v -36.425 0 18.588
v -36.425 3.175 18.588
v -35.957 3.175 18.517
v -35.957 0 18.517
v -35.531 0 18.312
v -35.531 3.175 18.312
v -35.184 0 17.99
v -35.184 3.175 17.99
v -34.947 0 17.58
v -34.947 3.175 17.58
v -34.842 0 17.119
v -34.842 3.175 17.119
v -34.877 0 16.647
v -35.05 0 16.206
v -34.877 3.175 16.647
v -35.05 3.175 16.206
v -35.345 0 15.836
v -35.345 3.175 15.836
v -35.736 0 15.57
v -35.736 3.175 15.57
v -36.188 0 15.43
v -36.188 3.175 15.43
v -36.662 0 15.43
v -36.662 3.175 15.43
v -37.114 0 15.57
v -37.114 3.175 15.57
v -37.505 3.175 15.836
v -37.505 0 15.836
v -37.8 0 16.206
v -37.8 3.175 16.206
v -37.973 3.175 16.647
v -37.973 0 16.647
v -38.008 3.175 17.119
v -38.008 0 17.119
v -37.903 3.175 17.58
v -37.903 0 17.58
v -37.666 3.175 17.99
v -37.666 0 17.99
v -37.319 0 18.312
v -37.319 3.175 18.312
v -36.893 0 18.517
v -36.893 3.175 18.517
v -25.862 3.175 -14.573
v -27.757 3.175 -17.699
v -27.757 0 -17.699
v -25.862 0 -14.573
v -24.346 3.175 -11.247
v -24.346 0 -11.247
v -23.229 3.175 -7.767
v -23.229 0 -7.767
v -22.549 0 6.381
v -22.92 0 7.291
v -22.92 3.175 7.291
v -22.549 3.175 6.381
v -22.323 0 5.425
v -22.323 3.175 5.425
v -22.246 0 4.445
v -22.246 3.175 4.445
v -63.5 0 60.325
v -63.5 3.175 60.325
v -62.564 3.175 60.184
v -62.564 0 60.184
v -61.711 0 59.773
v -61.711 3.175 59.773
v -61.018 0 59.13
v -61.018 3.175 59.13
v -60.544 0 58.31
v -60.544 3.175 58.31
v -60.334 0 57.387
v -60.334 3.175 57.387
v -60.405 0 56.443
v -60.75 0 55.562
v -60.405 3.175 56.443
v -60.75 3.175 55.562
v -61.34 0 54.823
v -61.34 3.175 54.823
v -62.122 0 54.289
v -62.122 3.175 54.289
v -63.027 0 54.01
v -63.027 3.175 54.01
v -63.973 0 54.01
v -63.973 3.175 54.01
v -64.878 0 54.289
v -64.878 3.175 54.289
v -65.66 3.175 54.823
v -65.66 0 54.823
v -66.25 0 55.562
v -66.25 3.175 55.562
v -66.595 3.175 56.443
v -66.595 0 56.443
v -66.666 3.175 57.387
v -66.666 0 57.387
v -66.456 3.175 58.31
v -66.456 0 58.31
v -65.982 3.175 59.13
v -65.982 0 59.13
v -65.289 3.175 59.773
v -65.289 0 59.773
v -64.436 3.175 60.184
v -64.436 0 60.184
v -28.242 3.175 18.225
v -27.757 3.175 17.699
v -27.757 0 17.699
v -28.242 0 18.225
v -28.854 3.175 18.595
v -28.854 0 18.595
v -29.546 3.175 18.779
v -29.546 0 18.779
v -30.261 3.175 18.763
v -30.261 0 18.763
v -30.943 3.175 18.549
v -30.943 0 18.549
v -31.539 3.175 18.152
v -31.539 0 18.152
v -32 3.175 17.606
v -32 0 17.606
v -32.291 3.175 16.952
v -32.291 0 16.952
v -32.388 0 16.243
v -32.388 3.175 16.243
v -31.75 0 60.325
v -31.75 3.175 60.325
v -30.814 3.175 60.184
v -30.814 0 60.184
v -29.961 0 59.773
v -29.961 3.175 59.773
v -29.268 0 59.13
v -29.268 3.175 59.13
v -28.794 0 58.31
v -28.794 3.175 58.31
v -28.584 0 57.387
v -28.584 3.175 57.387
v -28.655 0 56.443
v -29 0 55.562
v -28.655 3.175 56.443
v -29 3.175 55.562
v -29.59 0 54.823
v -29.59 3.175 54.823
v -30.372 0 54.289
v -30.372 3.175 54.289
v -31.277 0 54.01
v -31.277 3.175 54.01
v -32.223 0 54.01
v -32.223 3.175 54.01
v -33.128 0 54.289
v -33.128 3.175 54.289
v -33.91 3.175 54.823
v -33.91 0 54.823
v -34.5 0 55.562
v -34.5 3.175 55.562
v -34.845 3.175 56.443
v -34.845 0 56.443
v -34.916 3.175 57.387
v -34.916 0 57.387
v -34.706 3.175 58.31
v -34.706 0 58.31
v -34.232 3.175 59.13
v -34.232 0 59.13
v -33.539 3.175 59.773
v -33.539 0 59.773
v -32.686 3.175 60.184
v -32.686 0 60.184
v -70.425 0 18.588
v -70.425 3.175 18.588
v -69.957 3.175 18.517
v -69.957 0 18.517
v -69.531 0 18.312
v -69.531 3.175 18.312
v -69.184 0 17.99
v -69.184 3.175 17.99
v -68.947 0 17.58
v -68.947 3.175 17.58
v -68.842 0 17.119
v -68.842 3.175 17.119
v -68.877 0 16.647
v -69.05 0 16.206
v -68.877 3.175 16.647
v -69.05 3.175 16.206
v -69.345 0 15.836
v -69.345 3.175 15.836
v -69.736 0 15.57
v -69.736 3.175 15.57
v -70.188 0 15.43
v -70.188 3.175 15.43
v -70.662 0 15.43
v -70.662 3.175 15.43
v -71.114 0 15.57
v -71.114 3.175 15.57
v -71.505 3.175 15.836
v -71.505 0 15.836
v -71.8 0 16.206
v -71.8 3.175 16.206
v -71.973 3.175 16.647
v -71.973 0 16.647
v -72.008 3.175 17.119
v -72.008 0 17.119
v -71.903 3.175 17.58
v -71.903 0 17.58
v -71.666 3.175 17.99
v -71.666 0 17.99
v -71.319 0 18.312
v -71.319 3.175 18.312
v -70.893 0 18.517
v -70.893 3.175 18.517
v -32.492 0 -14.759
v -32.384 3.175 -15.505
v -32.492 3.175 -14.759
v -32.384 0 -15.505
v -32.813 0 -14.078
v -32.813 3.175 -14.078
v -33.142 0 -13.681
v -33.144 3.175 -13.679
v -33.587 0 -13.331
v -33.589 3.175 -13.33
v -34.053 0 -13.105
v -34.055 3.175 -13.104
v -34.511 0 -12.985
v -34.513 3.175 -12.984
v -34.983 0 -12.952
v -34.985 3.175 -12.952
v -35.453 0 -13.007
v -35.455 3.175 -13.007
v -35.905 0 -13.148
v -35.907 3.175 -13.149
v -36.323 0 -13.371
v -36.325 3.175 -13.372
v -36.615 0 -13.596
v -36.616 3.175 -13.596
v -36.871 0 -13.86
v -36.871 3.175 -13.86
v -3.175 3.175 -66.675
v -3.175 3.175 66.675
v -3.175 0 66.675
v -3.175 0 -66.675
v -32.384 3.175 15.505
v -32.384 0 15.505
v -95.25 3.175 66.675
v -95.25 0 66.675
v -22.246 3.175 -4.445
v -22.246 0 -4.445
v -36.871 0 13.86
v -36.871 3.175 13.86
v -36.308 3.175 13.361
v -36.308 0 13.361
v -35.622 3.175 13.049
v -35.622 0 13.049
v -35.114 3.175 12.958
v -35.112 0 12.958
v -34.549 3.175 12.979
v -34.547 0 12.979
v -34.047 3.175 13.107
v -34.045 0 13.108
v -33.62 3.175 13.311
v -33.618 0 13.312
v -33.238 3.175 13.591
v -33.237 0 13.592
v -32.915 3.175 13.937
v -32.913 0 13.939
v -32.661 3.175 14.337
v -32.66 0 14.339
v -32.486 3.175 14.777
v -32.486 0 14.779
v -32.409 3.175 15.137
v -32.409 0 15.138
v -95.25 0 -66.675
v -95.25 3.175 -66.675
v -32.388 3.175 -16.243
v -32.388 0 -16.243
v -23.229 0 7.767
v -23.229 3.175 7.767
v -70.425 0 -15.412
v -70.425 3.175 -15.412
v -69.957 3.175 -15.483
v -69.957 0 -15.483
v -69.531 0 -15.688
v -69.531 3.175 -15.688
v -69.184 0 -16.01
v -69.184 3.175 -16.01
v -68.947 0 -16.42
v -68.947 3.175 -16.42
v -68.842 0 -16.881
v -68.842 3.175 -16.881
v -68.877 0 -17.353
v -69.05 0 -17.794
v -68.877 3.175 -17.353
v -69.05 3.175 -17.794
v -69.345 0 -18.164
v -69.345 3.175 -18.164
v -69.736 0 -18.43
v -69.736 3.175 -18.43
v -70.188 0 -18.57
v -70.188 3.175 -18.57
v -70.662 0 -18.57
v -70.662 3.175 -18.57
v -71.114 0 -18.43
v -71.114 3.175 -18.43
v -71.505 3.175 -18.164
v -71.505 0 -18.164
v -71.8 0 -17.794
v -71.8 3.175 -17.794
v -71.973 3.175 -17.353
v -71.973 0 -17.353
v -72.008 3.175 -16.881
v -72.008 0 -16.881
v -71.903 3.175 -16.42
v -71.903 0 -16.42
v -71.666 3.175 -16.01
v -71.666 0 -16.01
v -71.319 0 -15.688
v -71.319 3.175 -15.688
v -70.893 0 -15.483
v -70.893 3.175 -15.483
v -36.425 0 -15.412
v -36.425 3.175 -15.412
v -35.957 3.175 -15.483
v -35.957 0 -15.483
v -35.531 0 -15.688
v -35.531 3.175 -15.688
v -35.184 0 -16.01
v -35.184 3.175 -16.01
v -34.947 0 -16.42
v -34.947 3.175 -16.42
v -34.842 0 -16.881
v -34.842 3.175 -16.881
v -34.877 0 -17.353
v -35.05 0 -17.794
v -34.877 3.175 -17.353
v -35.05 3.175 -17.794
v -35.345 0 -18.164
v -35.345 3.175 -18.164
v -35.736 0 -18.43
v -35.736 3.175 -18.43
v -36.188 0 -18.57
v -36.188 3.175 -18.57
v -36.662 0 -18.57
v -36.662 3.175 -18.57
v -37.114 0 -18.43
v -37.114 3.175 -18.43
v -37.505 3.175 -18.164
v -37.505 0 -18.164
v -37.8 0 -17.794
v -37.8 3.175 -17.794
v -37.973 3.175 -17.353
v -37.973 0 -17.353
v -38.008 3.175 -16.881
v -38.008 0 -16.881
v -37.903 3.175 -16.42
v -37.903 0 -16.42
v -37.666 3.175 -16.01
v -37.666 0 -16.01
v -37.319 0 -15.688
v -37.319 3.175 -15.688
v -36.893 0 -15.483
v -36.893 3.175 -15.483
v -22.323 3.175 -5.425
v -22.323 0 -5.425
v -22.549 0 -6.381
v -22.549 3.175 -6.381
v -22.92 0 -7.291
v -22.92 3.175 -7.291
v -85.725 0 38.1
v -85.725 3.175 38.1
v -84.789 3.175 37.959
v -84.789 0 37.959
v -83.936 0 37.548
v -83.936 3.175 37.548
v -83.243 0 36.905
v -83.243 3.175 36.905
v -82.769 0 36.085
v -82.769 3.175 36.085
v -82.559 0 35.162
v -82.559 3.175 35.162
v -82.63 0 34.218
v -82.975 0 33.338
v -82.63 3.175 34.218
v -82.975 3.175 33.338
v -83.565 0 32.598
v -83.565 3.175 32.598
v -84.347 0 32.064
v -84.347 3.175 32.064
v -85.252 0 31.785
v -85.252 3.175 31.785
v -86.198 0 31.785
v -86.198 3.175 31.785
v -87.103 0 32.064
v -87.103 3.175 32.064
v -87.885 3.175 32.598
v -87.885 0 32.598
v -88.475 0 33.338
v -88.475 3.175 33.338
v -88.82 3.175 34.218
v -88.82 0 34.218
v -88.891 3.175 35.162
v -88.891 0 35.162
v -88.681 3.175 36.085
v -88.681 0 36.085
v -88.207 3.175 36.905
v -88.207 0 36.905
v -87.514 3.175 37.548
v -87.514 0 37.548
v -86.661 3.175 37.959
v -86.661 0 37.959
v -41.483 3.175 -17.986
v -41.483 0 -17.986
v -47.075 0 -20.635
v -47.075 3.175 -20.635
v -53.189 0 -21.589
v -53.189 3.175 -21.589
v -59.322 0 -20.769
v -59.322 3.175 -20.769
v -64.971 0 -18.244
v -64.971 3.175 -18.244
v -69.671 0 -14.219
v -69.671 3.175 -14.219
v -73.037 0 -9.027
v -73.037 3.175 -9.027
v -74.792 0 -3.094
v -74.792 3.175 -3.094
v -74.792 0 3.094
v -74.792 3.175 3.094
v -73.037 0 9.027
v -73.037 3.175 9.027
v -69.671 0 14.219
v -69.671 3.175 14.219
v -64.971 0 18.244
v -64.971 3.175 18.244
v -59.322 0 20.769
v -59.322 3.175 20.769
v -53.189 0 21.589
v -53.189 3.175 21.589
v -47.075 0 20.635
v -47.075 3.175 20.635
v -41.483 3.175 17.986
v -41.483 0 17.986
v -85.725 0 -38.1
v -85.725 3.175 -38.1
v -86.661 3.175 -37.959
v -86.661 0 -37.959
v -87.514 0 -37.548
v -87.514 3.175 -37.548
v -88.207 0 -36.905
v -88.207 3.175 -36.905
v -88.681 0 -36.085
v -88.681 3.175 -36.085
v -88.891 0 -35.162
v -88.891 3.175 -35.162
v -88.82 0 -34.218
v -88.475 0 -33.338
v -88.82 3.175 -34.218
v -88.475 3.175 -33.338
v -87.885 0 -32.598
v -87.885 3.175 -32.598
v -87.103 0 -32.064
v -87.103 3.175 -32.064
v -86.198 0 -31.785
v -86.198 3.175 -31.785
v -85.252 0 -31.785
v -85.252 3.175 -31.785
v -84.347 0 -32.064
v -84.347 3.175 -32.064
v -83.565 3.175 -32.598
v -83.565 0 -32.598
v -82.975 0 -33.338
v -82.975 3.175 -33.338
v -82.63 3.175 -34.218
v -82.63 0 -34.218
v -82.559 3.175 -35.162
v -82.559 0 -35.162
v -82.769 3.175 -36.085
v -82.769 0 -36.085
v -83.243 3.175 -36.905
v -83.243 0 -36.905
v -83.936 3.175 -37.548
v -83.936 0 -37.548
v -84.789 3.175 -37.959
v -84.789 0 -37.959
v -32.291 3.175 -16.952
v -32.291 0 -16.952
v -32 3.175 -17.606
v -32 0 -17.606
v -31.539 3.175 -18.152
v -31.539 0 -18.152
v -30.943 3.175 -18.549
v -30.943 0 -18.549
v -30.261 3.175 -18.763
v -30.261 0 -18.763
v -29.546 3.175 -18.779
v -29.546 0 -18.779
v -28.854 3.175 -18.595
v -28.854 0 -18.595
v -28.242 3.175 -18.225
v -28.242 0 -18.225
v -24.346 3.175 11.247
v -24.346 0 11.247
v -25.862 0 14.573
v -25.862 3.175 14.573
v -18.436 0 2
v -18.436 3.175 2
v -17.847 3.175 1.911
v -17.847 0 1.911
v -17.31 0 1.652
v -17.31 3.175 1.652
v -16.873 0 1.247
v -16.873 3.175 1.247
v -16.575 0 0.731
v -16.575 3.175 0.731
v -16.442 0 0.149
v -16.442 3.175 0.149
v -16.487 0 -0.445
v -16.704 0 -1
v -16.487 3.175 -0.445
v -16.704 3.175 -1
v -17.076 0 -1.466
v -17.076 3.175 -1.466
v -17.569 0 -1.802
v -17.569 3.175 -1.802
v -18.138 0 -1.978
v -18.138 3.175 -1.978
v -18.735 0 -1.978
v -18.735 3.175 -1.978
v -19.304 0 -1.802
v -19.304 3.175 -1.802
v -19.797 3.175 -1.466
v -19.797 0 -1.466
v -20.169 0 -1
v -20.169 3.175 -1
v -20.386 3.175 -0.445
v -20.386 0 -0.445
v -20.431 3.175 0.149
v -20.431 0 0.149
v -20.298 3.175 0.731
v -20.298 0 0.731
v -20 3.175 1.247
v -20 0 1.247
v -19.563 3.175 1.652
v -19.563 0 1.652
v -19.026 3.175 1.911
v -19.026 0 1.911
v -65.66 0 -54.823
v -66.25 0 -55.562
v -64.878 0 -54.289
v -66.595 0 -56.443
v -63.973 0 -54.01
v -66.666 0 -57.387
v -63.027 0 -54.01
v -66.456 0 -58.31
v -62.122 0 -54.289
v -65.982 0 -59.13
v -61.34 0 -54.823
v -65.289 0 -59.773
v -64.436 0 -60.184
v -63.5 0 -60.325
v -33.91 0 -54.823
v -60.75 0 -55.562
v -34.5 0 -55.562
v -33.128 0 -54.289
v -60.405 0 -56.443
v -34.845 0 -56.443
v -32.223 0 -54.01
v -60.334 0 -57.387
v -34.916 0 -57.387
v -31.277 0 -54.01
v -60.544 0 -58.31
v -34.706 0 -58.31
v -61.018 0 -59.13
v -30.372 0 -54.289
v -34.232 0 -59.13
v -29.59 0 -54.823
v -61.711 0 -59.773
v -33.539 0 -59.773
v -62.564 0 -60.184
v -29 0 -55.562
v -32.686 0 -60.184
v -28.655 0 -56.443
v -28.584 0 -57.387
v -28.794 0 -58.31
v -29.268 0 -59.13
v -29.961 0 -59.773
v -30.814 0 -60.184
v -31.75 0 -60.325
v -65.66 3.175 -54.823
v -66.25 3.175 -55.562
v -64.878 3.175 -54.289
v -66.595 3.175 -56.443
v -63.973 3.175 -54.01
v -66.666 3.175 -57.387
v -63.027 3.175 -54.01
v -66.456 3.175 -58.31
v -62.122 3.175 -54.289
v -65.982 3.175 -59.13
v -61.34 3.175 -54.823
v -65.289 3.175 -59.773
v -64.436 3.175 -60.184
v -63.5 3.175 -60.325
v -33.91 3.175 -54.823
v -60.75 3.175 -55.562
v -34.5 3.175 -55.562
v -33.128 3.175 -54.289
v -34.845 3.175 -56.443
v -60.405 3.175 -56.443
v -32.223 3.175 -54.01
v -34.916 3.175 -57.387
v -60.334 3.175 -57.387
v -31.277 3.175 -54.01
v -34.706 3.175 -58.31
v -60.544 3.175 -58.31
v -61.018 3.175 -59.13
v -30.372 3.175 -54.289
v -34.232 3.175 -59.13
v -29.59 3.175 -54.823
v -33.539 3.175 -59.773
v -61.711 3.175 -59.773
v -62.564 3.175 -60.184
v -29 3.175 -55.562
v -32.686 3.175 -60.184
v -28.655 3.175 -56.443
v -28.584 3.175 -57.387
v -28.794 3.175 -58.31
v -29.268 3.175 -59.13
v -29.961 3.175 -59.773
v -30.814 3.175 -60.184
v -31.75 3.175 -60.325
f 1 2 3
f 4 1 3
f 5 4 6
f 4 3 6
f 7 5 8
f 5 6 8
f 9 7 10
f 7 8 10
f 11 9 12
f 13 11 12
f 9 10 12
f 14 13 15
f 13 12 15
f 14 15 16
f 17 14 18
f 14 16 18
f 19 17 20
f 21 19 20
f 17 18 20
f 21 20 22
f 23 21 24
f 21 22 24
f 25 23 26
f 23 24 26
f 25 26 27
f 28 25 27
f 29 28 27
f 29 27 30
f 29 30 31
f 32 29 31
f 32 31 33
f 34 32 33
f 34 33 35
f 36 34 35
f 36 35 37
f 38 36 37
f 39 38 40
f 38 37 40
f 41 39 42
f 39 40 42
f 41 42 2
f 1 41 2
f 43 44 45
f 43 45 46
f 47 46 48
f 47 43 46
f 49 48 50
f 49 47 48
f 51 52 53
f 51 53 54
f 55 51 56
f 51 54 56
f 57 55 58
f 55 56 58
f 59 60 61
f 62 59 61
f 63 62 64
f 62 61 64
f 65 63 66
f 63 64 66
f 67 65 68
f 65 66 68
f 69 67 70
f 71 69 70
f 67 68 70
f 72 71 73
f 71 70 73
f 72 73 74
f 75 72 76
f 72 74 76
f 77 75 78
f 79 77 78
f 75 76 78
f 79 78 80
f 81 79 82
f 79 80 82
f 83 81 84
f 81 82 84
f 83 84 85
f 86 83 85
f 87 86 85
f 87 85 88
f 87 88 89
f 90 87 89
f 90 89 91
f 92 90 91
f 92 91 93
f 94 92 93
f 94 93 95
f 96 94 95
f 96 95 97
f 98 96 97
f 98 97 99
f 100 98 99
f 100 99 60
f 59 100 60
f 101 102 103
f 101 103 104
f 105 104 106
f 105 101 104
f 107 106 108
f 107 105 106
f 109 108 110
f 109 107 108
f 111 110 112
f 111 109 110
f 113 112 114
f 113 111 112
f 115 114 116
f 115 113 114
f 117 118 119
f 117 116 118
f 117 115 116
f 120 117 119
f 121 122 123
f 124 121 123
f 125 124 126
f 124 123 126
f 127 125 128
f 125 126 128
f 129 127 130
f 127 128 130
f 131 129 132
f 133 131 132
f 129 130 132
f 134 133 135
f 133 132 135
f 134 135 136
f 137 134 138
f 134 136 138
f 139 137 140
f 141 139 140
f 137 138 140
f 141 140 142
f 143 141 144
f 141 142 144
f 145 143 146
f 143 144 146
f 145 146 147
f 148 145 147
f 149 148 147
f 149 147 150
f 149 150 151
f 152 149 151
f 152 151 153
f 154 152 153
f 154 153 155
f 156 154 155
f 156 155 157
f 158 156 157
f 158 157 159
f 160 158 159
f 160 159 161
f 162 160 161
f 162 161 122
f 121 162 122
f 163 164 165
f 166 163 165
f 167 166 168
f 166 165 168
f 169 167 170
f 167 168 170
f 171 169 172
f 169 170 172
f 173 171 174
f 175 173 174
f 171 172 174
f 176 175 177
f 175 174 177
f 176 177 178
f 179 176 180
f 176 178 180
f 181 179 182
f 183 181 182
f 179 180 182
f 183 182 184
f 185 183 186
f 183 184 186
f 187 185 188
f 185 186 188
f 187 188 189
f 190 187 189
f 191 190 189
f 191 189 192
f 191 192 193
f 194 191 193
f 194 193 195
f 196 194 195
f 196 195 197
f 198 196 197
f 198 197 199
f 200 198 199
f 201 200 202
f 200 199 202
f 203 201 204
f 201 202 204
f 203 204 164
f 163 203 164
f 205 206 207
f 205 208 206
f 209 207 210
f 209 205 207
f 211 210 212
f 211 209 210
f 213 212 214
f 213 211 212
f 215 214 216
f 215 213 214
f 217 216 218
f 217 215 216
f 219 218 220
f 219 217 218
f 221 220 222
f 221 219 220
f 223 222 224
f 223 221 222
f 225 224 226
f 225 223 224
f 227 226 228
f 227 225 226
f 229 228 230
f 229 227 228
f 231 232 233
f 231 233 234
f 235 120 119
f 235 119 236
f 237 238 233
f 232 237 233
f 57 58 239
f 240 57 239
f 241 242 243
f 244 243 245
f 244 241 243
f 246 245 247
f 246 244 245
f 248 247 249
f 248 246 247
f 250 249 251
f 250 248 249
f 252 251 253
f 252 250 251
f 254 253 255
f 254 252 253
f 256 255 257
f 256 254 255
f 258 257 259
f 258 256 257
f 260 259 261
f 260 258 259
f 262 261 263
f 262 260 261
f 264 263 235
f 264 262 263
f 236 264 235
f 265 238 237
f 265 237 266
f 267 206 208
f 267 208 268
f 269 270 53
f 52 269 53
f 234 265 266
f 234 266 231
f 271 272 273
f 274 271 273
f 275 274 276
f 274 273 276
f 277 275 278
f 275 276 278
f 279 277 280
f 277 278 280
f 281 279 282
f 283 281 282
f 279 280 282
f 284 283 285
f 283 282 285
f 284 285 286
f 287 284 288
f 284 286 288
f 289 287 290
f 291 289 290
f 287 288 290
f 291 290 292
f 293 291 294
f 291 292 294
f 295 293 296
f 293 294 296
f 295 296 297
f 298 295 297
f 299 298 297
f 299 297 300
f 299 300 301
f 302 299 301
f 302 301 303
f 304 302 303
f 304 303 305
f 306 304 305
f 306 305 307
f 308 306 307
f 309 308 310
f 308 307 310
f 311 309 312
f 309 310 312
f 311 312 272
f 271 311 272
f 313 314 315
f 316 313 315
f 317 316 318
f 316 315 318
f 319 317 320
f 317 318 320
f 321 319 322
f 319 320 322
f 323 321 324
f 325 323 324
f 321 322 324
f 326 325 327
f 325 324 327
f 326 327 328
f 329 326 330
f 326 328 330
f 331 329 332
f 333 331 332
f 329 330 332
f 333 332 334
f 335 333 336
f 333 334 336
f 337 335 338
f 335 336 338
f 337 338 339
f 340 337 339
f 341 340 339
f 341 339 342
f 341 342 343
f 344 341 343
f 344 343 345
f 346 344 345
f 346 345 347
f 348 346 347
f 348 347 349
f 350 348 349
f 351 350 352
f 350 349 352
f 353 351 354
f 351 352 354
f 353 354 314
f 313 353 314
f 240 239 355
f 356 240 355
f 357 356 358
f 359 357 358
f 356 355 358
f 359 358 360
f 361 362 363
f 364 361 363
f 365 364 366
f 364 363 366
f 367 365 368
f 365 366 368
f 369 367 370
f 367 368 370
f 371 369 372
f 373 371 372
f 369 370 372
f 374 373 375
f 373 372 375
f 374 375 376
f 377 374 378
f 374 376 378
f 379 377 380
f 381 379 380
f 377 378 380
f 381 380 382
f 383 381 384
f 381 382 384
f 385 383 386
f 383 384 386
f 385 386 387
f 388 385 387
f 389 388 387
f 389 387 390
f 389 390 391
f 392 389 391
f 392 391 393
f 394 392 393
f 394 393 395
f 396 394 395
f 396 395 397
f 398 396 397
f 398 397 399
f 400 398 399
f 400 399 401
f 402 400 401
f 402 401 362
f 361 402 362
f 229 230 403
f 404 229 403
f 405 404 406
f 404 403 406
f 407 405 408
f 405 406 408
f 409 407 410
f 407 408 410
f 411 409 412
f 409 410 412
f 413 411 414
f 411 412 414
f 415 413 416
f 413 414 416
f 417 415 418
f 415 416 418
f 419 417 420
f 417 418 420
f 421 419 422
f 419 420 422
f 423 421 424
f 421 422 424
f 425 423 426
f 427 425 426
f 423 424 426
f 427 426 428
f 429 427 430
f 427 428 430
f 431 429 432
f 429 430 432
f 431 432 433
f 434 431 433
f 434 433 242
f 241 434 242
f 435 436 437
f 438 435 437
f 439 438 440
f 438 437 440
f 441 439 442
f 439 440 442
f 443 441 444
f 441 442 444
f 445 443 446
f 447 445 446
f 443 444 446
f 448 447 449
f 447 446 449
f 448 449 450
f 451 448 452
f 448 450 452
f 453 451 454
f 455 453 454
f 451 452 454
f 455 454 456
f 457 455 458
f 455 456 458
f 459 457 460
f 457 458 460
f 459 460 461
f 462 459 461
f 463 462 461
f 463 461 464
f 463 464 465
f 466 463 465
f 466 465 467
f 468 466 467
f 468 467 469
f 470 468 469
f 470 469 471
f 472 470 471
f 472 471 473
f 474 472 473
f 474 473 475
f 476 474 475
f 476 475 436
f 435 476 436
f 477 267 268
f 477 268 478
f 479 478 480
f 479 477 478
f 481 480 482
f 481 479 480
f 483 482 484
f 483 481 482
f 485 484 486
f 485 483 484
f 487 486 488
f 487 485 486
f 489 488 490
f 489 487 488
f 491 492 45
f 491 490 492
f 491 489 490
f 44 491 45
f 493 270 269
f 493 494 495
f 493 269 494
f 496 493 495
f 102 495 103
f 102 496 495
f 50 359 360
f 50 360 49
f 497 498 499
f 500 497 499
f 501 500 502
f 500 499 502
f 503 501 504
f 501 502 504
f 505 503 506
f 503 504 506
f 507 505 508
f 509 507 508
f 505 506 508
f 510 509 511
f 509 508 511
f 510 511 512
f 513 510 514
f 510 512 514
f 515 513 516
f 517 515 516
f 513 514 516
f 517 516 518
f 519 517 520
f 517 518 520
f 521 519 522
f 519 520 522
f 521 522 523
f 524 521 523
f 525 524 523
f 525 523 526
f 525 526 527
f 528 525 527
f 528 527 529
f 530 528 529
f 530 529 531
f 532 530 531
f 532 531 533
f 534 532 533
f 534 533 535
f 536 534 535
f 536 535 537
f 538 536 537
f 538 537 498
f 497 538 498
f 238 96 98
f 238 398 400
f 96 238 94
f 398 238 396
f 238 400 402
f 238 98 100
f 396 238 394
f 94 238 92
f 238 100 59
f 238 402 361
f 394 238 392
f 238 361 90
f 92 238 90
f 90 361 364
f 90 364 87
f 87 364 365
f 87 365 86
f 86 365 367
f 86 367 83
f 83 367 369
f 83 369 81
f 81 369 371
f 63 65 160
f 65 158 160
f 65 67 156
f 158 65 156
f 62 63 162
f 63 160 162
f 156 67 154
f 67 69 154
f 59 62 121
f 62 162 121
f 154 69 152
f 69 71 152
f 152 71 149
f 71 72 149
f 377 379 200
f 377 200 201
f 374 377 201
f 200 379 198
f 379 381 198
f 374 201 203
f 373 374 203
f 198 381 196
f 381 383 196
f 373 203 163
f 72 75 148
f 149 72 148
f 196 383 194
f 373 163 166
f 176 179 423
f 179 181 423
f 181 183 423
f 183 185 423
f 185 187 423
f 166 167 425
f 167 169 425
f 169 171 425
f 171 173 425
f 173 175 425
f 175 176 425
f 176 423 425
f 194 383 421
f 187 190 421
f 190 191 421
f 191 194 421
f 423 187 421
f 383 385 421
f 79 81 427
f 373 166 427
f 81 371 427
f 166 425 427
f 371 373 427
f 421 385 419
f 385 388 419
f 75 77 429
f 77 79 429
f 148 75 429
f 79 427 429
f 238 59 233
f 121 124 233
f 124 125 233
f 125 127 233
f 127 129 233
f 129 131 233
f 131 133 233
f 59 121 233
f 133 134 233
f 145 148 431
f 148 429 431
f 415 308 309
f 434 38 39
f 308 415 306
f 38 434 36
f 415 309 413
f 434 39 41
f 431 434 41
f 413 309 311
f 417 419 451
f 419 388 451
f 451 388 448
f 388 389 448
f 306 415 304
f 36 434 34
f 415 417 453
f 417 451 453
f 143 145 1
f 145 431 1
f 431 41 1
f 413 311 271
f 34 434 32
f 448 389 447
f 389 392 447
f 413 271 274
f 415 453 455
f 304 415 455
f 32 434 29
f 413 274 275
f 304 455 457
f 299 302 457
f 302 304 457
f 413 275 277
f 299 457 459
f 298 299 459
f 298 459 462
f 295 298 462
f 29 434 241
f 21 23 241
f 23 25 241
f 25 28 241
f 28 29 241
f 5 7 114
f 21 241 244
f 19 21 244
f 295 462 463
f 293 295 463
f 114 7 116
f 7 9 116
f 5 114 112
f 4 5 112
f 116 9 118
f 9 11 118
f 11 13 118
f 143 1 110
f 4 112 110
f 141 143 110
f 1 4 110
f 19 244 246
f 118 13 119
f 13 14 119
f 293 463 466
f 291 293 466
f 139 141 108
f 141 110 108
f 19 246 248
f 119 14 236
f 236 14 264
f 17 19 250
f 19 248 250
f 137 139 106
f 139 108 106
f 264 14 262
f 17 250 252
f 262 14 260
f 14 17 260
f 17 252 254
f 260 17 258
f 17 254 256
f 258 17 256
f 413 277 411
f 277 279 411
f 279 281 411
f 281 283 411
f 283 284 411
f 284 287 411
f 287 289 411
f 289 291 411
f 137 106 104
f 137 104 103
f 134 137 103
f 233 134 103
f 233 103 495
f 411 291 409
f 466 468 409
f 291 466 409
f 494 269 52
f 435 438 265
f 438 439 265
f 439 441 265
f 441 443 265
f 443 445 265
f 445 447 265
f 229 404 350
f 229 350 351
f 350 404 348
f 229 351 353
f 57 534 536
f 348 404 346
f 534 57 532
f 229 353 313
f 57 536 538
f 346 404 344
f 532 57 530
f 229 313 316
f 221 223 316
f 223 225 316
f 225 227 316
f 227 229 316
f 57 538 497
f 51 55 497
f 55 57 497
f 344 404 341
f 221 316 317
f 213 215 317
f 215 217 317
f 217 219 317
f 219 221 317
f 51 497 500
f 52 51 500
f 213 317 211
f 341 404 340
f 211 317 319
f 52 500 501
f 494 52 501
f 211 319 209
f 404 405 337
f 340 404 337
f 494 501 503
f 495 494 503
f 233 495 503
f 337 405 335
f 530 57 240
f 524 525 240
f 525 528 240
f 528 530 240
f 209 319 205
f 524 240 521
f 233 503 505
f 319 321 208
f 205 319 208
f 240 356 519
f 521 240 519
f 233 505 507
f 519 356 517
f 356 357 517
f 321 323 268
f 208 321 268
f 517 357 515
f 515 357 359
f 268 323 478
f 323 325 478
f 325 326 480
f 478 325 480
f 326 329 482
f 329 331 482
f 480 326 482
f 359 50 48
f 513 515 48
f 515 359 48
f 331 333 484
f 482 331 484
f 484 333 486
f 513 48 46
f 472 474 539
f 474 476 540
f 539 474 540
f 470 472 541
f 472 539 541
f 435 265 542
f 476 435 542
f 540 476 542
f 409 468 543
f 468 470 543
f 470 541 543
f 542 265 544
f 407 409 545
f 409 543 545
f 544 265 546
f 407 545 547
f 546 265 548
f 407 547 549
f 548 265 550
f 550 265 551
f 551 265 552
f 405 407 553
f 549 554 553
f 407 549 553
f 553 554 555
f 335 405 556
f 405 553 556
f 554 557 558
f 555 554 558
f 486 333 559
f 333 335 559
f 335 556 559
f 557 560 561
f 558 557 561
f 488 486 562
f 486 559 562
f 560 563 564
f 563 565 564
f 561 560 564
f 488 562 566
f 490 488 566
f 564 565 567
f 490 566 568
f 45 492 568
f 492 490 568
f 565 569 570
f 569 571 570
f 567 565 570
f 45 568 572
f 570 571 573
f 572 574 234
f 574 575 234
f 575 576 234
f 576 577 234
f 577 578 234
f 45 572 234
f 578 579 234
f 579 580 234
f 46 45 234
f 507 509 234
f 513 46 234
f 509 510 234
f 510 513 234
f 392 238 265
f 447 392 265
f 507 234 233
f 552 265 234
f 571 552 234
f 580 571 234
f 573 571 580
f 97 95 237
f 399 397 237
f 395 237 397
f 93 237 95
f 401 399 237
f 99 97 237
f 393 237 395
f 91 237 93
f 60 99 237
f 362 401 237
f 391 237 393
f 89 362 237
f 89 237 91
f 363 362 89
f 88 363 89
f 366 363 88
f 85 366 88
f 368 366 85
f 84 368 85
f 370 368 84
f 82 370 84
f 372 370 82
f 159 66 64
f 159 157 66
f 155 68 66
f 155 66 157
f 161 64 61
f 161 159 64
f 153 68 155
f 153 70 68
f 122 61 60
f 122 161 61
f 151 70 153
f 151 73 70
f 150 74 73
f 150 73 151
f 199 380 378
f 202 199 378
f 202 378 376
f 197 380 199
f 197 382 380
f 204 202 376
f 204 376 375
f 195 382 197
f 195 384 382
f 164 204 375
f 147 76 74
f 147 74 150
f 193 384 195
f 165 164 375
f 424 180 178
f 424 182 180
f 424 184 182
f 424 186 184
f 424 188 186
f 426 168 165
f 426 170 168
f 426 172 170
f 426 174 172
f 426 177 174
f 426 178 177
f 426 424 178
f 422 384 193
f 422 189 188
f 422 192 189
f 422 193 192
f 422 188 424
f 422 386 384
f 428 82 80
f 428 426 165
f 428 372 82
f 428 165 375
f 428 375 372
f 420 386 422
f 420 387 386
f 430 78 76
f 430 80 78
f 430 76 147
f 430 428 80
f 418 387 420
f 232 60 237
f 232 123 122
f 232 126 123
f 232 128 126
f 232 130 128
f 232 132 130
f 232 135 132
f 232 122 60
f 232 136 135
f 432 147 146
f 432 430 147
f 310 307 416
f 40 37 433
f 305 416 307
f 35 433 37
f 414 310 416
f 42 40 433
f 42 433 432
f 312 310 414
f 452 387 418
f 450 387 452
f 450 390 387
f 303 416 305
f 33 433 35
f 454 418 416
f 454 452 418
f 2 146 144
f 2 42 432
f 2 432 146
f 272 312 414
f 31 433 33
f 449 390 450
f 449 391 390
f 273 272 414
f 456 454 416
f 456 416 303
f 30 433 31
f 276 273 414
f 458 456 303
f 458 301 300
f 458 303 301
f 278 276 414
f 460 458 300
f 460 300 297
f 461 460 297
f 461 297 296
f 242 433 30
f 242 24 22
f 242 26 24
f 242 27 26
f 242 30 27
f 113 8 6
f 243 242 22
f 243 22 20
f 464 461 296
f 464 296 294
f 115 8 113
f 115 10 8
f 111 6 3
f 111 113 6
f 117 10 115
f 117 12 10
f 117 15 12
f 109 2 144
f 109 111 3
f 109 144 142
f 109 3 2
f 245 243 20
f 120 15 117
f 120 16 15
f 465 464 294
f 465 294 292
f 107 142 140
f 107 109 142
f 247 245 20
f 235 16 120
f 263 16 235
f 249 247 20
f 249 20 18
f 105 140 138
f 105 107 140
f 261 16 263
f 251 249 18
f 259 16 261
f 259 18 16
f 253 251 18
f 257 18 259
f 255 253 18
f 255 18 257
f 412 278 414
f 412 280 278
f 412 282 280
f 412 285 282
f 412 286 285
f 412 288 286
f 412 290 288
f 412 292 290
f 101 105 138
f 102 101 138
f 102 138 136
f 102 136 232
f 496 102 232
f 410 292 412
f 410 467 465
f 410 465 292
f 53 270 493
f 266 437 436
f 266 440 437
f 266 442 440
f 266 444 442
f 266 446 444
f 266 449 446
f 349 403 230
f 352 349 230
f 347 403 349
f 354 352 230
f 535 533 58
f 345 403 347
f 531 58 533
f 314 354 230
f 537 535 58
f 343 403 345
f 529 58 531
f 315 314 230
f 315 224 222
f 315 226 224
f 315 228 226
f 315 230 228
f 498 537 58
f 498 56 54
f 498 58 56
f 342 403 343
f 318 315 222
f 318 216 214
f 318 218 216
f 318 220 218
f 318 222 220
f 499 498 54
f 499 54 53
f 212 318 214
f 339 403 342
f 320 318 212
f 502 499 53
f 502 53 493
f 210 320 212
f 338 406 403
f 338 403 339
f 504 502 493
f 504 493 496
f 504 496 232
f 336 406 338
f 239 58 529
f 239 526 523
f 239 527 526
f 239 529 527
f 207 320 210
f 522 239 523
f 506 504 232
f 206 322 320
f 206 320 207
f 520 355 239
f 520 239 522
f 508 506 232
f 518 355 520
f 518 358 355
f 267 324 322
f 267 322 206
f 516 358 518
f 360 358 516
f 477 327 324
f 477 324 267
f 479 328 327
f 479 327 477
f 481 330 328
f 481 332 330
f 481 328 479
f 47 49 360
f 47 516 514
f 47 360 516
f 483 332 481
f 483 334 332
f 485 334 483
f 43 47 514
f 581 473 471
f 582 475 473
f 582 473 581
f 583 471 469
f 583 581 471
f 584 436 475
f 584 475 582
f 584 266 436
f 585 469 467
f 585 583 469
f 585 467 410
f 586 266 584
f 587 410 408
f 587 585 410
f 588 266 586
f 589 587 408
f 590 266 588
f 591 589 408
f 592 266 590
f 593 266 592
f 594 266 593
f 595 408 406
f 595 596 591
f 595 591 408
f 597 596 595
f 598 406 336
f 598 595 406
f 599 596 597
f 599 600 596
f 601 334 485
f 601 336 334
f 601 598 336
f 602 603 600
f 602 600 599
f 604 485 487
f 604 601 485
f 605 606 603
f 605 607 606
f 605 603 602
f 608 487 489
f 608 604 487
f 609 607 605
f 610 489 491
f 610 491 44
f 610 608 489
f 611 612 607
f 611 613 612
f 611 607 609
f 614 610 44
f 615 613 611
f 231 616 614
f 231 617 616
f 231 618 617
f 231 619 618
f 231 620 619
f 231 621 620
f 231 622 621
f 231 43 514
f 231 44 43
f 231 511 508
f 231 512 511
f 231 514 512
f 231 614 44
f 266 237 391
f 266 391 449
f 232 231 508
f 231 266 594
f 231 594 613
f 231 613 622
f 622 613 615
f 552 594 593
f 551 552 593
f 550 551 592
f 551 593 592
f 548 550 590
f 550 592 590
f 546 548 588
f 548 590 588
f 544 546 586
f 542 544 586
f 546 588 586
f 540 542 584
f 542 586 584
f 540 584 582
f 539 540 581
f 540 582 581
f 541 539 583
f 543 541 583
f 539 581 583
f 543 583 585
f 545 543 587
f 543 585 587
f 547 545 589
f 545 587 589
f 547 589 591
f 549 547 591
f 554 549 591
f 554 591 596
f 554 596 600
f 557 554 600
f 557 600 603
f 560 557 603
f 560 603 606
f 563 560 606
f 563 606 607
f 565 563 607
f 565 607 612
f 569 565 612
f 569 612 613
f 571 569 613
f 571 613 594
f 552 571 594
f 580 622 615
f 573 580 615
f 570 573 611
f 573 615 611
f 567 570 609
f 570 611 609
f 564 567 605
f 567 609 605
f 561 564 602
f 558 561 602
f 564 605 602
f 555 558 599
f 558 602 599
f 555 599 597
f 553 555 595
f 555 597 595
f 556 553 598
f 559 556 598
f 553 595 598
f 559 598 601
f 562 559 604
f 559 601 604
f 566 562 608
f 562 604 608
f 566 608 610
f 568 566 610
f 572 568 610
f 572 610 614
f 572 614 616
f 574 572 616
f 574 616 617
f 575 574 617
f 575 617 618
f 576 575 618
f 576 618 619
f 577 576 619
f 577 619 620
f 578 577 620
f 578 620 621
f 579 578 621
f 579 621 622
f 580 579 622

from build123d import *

# Parameters (mm, degrees)
SKETCH1_W           = 190.5
SKETCH1_H           = 133.35
BOSS_EXTRUDE1_DEPTH = 3.175
SKETCH3_R           = 21.59
CUT_EXTRUDE2_DEPTH  = 117.310785183
SKETCH4_R           = 1.5875
CUT_EXTRUDE3_DEPTH  = 3.175
SKETCH9_R           = 2
CUT_EXTRUDE5_DEPTH  = 10
SKETCH12_W          = 98.425
SKETCH12_H          = 133.35
CUT_EXTRUDE6_DEPTH  = 117.310785183
SKETCH13_R          = 3.175
CUT_EXTRUDE7_DEPTH  = 117.310785183
CUT_EXTRUDE8_DEPTH  = 117.310785183
BOSS_EXTRUDE2_DEPTH = 3.175
FILLET1_R           = 2.54
CUT_EXTRUDE9_DEPTH  = 117.310785325
FILLET2_R           = 2.54


with BuildPart() as part:
    # Sketch1 → Boss-Extrude1 (new body)
    with BuildSketch(Plane(origin=(0, 0, 0), x_dir=(1, 0, 0), z_dir=(0, 1, 0))):
        Rectangle(SKETCH1_W, SKETCH1_H)
    extrude(amount=BOSS_EXTRUDE1_DEPTH)

    # Sketch3 → Cut-Extrude2 (cut, through all)
    with BuildSketch(Plane(origin=(0, 3.175, 0), x_dir=(1, 0, 0), z_dir=(0, 1, 0))):
        with Locations(Location((-53.425, 0, 0), (0, 0, 270))):
            Circle(SKETCH3_R)
    extrude(amount=-CUT_EXTRUDE2_DEPTH, mode=Mode.SUBTRACT)

    # Sketch4 → Cut-Extrude3 (cut)
    with BuildSketch(Plane(origin=(0, 3.175, 0), x_dir=(1, 0, 0), z_dir=(0, 1, 0))):
        with Locations(Location((-70.425, 17, 0), (0, 0, 270))):
            Circle(SKETCH4_R)
        with Locations(Location((-36.425, 17, 0), (0, 0, 270))):
            Circle(SKETCH4_R)
        with Locations(Location((-70.425, -17, 0), (0, 0, 270))):
            Circle(SKETCH4_R)
        with Locations(Location((-36.425, -17, 0), (0, 0, 270))):
            Circle(SKETCH4_R)
    extrude(amount=-CUT_EXTRUDE3_DEPTH, mode=Mode.SUBTRACT)

    # Sketch9 → Cut-Extrude5 (cut)
    with BuildSketch(Plane(origin=(0, 3.175, 0), x_dir=(1, 0, 0), z_dir=(0, 1, 0))):
        with Locations(Location((-18.4365, 0, 0), (0, 0, 270))):
            Circle(SKETCH9_R)
    extrude(amount=-CUT_EXTRUDE5_DEPTH, mode=Mode.SUBTRACT)

    # Sketch12 → Cut-Extrude6 (cut, through all)
    with BuildSketch(Plane(origin=(0, 3.175, 0), x_dir=(1, 0, 0), z_dir=(0, 1, 0))):
        with Locations((46.0375, 0)):
            Rectangle(SKETCH12_W, SKETCH12_H)
    extrude(amount=-CUT_EXTRUDE6_DEPTH, mode=Mode.SUBTRACT)

    # Sketch13 → Cut-Extrude7 (cut, through all)
    with BuildSketch(Plane(origin=(0, 3.175, 0), x_dir=(1, 0, 0), z_dir=(0, 1, 0))):
        with Locations(Location((-63.5, -57.15, 0), (0, 0, 270))):
            Circle(SKETCH13_R)
        with Locations(Location((-31.75, -57.15, 0), (0, 0, 270))):
            Circle(SKETCH13_R)
        with Locations(Location((-85.725, -34.925, 0), (0, 0, 270))):
            Circle(SKETCH13_R)
        with Locations(Location((-85.725, 34.925, 0), (0, 0, 90))):
            Circle(SKETCH13_R)
        with Locations(Location((-31.75, 57.15, 0), (0, 0, 90))):
            Circle(SKETCH13_R)
        with Locations(Location((-63.5, 57.15, 0), (0, 0, 90))):
            Circle(SKETCH13_R)
    extrude(amount=-CUT_EXTRUDE7_DEPTH, mode=Mode.SUBTRACT)

    # Sketch14 → Cut-Extrude8 (cut, through all)
    with BuildSketch(Plane(origin=(0, 3.175, 0), x_dir=(1, 0, 0), z_dir=(0, 1, 0))):
        with BuildLine():
            Line((-28.5965, 10.795), (-34.727511532, 10.795))
            ThreePointArc((-34.727511532, 10.795), (-32.57066141, 5.587903184), (-31.835, 0))
            ThreePointArc((-31.835, 0), (-32.57066141, -5.587903184), (-34.727511532, -10.795))
            Line((-34.727511532, -10.795), (-28.5965, -10.795))
            ThreePointArc((-28.5965, -10.795), (-24.106371939, -8.935128061), (-22.2465, -4.445))
            Line((-22.2465, -4.445), (-22.2465, 4.445))
            ThreePointArc((-22.2465, 4.445), (-24.106371939, 8.935128061), (-28.5965, 10.795))
        make_face()
    extrude(amount=-CUT_EXTRUDE8_DEPTH, mode=Mode.SUBTRACT)

    # Sketch17 → Boss-Extrude2 (add)
    with BuildSketch(Plane(origin=(0, 3.175, 0), x_dir=(1, 0, 0), z_dir=(0, 1, 0))):
        with BuildLine():
            Line((-27.617916938, -2.569394862), (-29.842146395, -2.569394862))
            ThreePointArc((-29.842146395, -2.569394862), (-31.436748095, -3.132314839), (-32.324552038, -4.571563824))
            ThreePointArc((-32.324552038, -4.571563824), (-33.284202462, -7.776655742), (-34.727511532, -10.795))
            Line((-34.727511532, -10.795), (-28.5965, -10.795))
            ThreePointArc((-28.5965, -10.795), (-26.282004071, -10.358172465), (-24.285944537, -9.107790109))
            add(Edge.make_bspline(
                [(-24.285944537, -9.107790109), (-25.296427545, -8.702059101), (-27.426842977, -8.424005167), (-31.492325334, -5.200003891), (-29.562733021, -3.217728636), (-27.592836679, -2.82089378)],
                knots=[0.242965458, 0.242965458, 0.242965458, 0.242965458, 0.418906137, 0.719122828, 0.942603955, 0.942603955, 0.942603955, 0.942603955], degree=3))
            ThreePointArc((-27.592836679, -2.82089378), (-27.491543755, -2.683792533), (-27.617916938, -2.569394862))
        make_face()
        with BuildLine():
            Line((-34.727511532, 10.795), (-28.5965, 10.795))
            ThreePointArc((-28.5965, 10.795), (-26.282004071, 10.358172465), (-24.285944537, 9.107790109))
            add(Edge.make_bspline(
                [(-24.285944537, 9.107790109), (-25.296427545, 8.702059101), (-27.426842977, 8.424005167), (-31.492325334, 5.200003891), (-29.562733021, 3.217728636), (-27.592836679, 2.82089378)],
                knots=[0.242965458, 0.242965458, 0.242965458, 0.242965458, 0.418906137, 0.719122828, 0.942603955, 0.942603955, 0.942603955, 0.942603955], degree=3))
            ThreePointArc((-27.592836679, 2.82089378), (-27.491543755, 2.683792533), (-27.617916938, 2.569394862))
            Line((-27.617916938, 2.569394862), (-29.842146395, 2.569394862))
            ThreePointArc((-29.842146395, 2.569394862), (-31.436748095, 3.132314839), (-32.324552038, 4.571563824))
            ThreePointArc((-32.324552038, 4.571563824), (-33.284202462, 7.776655742), (-34.727511532, 10.795))
        make_face()
    extrude(amount=-BOSS_EXTRUDE2_DEPTH)

    # Fillet1
    fillet1_edges = [part.edges().sort_by_distance(p)[0] for p in [
        (-24.285944537, 1.5875, 9.107790109),
        (-24.285944537, 1.5875, -9.107790109),
    ]]
    fillet(fillet1_edges, radius=FILLET1_R)

    # Sketch20 → Cut-Extrude9 (cut, through all)
    with BuildSketch(Plane(origin=(0, 3.175, 0), x_dir=(1, 0, 0), z_dir=(0, 1, 0))):
        with BuildLine():
            Line((-32.388013842, -16.243224247), (-32.324552038, -4.571563824))
            ThreePointArc((-32.324552038, -4.571563824), (-31.835, 0), (-32.324552038, 4.571563824))
            Line((-32.324552038, 4.571563824), (-32.388013842, 16.243224247))
            ThreePointArc((-32.388013842, 16.243224247), (-30.609708534, 18.68014804), (-27.75696947, 17.698900276))
            ThreePointArc((-27.75696947, 17.698900276), (-22.2465, 0), (-27.75696947, -17.698900276))
            ThreePointArc((-27.75696947, -17.698900276), (-30.609708534, -18.68014804), (-32.388013842, -16.243224247))
        make_face()
    extrude(amount=-CUT_EXTRUDE9_DEPTH, mode=Mode.SUBTRACT)

    # Fillet2
    fillet2_edges = [part.edges().sort_by_distance(p)[0] for p in [
        (-32.324552038, 1.5875, 4.571563824),
        (-32.324552038, 1.5875, -4.571563824),
    ]]
    fillet(fillet2_edges, radius=FILLET2_R)


solid = part.part
